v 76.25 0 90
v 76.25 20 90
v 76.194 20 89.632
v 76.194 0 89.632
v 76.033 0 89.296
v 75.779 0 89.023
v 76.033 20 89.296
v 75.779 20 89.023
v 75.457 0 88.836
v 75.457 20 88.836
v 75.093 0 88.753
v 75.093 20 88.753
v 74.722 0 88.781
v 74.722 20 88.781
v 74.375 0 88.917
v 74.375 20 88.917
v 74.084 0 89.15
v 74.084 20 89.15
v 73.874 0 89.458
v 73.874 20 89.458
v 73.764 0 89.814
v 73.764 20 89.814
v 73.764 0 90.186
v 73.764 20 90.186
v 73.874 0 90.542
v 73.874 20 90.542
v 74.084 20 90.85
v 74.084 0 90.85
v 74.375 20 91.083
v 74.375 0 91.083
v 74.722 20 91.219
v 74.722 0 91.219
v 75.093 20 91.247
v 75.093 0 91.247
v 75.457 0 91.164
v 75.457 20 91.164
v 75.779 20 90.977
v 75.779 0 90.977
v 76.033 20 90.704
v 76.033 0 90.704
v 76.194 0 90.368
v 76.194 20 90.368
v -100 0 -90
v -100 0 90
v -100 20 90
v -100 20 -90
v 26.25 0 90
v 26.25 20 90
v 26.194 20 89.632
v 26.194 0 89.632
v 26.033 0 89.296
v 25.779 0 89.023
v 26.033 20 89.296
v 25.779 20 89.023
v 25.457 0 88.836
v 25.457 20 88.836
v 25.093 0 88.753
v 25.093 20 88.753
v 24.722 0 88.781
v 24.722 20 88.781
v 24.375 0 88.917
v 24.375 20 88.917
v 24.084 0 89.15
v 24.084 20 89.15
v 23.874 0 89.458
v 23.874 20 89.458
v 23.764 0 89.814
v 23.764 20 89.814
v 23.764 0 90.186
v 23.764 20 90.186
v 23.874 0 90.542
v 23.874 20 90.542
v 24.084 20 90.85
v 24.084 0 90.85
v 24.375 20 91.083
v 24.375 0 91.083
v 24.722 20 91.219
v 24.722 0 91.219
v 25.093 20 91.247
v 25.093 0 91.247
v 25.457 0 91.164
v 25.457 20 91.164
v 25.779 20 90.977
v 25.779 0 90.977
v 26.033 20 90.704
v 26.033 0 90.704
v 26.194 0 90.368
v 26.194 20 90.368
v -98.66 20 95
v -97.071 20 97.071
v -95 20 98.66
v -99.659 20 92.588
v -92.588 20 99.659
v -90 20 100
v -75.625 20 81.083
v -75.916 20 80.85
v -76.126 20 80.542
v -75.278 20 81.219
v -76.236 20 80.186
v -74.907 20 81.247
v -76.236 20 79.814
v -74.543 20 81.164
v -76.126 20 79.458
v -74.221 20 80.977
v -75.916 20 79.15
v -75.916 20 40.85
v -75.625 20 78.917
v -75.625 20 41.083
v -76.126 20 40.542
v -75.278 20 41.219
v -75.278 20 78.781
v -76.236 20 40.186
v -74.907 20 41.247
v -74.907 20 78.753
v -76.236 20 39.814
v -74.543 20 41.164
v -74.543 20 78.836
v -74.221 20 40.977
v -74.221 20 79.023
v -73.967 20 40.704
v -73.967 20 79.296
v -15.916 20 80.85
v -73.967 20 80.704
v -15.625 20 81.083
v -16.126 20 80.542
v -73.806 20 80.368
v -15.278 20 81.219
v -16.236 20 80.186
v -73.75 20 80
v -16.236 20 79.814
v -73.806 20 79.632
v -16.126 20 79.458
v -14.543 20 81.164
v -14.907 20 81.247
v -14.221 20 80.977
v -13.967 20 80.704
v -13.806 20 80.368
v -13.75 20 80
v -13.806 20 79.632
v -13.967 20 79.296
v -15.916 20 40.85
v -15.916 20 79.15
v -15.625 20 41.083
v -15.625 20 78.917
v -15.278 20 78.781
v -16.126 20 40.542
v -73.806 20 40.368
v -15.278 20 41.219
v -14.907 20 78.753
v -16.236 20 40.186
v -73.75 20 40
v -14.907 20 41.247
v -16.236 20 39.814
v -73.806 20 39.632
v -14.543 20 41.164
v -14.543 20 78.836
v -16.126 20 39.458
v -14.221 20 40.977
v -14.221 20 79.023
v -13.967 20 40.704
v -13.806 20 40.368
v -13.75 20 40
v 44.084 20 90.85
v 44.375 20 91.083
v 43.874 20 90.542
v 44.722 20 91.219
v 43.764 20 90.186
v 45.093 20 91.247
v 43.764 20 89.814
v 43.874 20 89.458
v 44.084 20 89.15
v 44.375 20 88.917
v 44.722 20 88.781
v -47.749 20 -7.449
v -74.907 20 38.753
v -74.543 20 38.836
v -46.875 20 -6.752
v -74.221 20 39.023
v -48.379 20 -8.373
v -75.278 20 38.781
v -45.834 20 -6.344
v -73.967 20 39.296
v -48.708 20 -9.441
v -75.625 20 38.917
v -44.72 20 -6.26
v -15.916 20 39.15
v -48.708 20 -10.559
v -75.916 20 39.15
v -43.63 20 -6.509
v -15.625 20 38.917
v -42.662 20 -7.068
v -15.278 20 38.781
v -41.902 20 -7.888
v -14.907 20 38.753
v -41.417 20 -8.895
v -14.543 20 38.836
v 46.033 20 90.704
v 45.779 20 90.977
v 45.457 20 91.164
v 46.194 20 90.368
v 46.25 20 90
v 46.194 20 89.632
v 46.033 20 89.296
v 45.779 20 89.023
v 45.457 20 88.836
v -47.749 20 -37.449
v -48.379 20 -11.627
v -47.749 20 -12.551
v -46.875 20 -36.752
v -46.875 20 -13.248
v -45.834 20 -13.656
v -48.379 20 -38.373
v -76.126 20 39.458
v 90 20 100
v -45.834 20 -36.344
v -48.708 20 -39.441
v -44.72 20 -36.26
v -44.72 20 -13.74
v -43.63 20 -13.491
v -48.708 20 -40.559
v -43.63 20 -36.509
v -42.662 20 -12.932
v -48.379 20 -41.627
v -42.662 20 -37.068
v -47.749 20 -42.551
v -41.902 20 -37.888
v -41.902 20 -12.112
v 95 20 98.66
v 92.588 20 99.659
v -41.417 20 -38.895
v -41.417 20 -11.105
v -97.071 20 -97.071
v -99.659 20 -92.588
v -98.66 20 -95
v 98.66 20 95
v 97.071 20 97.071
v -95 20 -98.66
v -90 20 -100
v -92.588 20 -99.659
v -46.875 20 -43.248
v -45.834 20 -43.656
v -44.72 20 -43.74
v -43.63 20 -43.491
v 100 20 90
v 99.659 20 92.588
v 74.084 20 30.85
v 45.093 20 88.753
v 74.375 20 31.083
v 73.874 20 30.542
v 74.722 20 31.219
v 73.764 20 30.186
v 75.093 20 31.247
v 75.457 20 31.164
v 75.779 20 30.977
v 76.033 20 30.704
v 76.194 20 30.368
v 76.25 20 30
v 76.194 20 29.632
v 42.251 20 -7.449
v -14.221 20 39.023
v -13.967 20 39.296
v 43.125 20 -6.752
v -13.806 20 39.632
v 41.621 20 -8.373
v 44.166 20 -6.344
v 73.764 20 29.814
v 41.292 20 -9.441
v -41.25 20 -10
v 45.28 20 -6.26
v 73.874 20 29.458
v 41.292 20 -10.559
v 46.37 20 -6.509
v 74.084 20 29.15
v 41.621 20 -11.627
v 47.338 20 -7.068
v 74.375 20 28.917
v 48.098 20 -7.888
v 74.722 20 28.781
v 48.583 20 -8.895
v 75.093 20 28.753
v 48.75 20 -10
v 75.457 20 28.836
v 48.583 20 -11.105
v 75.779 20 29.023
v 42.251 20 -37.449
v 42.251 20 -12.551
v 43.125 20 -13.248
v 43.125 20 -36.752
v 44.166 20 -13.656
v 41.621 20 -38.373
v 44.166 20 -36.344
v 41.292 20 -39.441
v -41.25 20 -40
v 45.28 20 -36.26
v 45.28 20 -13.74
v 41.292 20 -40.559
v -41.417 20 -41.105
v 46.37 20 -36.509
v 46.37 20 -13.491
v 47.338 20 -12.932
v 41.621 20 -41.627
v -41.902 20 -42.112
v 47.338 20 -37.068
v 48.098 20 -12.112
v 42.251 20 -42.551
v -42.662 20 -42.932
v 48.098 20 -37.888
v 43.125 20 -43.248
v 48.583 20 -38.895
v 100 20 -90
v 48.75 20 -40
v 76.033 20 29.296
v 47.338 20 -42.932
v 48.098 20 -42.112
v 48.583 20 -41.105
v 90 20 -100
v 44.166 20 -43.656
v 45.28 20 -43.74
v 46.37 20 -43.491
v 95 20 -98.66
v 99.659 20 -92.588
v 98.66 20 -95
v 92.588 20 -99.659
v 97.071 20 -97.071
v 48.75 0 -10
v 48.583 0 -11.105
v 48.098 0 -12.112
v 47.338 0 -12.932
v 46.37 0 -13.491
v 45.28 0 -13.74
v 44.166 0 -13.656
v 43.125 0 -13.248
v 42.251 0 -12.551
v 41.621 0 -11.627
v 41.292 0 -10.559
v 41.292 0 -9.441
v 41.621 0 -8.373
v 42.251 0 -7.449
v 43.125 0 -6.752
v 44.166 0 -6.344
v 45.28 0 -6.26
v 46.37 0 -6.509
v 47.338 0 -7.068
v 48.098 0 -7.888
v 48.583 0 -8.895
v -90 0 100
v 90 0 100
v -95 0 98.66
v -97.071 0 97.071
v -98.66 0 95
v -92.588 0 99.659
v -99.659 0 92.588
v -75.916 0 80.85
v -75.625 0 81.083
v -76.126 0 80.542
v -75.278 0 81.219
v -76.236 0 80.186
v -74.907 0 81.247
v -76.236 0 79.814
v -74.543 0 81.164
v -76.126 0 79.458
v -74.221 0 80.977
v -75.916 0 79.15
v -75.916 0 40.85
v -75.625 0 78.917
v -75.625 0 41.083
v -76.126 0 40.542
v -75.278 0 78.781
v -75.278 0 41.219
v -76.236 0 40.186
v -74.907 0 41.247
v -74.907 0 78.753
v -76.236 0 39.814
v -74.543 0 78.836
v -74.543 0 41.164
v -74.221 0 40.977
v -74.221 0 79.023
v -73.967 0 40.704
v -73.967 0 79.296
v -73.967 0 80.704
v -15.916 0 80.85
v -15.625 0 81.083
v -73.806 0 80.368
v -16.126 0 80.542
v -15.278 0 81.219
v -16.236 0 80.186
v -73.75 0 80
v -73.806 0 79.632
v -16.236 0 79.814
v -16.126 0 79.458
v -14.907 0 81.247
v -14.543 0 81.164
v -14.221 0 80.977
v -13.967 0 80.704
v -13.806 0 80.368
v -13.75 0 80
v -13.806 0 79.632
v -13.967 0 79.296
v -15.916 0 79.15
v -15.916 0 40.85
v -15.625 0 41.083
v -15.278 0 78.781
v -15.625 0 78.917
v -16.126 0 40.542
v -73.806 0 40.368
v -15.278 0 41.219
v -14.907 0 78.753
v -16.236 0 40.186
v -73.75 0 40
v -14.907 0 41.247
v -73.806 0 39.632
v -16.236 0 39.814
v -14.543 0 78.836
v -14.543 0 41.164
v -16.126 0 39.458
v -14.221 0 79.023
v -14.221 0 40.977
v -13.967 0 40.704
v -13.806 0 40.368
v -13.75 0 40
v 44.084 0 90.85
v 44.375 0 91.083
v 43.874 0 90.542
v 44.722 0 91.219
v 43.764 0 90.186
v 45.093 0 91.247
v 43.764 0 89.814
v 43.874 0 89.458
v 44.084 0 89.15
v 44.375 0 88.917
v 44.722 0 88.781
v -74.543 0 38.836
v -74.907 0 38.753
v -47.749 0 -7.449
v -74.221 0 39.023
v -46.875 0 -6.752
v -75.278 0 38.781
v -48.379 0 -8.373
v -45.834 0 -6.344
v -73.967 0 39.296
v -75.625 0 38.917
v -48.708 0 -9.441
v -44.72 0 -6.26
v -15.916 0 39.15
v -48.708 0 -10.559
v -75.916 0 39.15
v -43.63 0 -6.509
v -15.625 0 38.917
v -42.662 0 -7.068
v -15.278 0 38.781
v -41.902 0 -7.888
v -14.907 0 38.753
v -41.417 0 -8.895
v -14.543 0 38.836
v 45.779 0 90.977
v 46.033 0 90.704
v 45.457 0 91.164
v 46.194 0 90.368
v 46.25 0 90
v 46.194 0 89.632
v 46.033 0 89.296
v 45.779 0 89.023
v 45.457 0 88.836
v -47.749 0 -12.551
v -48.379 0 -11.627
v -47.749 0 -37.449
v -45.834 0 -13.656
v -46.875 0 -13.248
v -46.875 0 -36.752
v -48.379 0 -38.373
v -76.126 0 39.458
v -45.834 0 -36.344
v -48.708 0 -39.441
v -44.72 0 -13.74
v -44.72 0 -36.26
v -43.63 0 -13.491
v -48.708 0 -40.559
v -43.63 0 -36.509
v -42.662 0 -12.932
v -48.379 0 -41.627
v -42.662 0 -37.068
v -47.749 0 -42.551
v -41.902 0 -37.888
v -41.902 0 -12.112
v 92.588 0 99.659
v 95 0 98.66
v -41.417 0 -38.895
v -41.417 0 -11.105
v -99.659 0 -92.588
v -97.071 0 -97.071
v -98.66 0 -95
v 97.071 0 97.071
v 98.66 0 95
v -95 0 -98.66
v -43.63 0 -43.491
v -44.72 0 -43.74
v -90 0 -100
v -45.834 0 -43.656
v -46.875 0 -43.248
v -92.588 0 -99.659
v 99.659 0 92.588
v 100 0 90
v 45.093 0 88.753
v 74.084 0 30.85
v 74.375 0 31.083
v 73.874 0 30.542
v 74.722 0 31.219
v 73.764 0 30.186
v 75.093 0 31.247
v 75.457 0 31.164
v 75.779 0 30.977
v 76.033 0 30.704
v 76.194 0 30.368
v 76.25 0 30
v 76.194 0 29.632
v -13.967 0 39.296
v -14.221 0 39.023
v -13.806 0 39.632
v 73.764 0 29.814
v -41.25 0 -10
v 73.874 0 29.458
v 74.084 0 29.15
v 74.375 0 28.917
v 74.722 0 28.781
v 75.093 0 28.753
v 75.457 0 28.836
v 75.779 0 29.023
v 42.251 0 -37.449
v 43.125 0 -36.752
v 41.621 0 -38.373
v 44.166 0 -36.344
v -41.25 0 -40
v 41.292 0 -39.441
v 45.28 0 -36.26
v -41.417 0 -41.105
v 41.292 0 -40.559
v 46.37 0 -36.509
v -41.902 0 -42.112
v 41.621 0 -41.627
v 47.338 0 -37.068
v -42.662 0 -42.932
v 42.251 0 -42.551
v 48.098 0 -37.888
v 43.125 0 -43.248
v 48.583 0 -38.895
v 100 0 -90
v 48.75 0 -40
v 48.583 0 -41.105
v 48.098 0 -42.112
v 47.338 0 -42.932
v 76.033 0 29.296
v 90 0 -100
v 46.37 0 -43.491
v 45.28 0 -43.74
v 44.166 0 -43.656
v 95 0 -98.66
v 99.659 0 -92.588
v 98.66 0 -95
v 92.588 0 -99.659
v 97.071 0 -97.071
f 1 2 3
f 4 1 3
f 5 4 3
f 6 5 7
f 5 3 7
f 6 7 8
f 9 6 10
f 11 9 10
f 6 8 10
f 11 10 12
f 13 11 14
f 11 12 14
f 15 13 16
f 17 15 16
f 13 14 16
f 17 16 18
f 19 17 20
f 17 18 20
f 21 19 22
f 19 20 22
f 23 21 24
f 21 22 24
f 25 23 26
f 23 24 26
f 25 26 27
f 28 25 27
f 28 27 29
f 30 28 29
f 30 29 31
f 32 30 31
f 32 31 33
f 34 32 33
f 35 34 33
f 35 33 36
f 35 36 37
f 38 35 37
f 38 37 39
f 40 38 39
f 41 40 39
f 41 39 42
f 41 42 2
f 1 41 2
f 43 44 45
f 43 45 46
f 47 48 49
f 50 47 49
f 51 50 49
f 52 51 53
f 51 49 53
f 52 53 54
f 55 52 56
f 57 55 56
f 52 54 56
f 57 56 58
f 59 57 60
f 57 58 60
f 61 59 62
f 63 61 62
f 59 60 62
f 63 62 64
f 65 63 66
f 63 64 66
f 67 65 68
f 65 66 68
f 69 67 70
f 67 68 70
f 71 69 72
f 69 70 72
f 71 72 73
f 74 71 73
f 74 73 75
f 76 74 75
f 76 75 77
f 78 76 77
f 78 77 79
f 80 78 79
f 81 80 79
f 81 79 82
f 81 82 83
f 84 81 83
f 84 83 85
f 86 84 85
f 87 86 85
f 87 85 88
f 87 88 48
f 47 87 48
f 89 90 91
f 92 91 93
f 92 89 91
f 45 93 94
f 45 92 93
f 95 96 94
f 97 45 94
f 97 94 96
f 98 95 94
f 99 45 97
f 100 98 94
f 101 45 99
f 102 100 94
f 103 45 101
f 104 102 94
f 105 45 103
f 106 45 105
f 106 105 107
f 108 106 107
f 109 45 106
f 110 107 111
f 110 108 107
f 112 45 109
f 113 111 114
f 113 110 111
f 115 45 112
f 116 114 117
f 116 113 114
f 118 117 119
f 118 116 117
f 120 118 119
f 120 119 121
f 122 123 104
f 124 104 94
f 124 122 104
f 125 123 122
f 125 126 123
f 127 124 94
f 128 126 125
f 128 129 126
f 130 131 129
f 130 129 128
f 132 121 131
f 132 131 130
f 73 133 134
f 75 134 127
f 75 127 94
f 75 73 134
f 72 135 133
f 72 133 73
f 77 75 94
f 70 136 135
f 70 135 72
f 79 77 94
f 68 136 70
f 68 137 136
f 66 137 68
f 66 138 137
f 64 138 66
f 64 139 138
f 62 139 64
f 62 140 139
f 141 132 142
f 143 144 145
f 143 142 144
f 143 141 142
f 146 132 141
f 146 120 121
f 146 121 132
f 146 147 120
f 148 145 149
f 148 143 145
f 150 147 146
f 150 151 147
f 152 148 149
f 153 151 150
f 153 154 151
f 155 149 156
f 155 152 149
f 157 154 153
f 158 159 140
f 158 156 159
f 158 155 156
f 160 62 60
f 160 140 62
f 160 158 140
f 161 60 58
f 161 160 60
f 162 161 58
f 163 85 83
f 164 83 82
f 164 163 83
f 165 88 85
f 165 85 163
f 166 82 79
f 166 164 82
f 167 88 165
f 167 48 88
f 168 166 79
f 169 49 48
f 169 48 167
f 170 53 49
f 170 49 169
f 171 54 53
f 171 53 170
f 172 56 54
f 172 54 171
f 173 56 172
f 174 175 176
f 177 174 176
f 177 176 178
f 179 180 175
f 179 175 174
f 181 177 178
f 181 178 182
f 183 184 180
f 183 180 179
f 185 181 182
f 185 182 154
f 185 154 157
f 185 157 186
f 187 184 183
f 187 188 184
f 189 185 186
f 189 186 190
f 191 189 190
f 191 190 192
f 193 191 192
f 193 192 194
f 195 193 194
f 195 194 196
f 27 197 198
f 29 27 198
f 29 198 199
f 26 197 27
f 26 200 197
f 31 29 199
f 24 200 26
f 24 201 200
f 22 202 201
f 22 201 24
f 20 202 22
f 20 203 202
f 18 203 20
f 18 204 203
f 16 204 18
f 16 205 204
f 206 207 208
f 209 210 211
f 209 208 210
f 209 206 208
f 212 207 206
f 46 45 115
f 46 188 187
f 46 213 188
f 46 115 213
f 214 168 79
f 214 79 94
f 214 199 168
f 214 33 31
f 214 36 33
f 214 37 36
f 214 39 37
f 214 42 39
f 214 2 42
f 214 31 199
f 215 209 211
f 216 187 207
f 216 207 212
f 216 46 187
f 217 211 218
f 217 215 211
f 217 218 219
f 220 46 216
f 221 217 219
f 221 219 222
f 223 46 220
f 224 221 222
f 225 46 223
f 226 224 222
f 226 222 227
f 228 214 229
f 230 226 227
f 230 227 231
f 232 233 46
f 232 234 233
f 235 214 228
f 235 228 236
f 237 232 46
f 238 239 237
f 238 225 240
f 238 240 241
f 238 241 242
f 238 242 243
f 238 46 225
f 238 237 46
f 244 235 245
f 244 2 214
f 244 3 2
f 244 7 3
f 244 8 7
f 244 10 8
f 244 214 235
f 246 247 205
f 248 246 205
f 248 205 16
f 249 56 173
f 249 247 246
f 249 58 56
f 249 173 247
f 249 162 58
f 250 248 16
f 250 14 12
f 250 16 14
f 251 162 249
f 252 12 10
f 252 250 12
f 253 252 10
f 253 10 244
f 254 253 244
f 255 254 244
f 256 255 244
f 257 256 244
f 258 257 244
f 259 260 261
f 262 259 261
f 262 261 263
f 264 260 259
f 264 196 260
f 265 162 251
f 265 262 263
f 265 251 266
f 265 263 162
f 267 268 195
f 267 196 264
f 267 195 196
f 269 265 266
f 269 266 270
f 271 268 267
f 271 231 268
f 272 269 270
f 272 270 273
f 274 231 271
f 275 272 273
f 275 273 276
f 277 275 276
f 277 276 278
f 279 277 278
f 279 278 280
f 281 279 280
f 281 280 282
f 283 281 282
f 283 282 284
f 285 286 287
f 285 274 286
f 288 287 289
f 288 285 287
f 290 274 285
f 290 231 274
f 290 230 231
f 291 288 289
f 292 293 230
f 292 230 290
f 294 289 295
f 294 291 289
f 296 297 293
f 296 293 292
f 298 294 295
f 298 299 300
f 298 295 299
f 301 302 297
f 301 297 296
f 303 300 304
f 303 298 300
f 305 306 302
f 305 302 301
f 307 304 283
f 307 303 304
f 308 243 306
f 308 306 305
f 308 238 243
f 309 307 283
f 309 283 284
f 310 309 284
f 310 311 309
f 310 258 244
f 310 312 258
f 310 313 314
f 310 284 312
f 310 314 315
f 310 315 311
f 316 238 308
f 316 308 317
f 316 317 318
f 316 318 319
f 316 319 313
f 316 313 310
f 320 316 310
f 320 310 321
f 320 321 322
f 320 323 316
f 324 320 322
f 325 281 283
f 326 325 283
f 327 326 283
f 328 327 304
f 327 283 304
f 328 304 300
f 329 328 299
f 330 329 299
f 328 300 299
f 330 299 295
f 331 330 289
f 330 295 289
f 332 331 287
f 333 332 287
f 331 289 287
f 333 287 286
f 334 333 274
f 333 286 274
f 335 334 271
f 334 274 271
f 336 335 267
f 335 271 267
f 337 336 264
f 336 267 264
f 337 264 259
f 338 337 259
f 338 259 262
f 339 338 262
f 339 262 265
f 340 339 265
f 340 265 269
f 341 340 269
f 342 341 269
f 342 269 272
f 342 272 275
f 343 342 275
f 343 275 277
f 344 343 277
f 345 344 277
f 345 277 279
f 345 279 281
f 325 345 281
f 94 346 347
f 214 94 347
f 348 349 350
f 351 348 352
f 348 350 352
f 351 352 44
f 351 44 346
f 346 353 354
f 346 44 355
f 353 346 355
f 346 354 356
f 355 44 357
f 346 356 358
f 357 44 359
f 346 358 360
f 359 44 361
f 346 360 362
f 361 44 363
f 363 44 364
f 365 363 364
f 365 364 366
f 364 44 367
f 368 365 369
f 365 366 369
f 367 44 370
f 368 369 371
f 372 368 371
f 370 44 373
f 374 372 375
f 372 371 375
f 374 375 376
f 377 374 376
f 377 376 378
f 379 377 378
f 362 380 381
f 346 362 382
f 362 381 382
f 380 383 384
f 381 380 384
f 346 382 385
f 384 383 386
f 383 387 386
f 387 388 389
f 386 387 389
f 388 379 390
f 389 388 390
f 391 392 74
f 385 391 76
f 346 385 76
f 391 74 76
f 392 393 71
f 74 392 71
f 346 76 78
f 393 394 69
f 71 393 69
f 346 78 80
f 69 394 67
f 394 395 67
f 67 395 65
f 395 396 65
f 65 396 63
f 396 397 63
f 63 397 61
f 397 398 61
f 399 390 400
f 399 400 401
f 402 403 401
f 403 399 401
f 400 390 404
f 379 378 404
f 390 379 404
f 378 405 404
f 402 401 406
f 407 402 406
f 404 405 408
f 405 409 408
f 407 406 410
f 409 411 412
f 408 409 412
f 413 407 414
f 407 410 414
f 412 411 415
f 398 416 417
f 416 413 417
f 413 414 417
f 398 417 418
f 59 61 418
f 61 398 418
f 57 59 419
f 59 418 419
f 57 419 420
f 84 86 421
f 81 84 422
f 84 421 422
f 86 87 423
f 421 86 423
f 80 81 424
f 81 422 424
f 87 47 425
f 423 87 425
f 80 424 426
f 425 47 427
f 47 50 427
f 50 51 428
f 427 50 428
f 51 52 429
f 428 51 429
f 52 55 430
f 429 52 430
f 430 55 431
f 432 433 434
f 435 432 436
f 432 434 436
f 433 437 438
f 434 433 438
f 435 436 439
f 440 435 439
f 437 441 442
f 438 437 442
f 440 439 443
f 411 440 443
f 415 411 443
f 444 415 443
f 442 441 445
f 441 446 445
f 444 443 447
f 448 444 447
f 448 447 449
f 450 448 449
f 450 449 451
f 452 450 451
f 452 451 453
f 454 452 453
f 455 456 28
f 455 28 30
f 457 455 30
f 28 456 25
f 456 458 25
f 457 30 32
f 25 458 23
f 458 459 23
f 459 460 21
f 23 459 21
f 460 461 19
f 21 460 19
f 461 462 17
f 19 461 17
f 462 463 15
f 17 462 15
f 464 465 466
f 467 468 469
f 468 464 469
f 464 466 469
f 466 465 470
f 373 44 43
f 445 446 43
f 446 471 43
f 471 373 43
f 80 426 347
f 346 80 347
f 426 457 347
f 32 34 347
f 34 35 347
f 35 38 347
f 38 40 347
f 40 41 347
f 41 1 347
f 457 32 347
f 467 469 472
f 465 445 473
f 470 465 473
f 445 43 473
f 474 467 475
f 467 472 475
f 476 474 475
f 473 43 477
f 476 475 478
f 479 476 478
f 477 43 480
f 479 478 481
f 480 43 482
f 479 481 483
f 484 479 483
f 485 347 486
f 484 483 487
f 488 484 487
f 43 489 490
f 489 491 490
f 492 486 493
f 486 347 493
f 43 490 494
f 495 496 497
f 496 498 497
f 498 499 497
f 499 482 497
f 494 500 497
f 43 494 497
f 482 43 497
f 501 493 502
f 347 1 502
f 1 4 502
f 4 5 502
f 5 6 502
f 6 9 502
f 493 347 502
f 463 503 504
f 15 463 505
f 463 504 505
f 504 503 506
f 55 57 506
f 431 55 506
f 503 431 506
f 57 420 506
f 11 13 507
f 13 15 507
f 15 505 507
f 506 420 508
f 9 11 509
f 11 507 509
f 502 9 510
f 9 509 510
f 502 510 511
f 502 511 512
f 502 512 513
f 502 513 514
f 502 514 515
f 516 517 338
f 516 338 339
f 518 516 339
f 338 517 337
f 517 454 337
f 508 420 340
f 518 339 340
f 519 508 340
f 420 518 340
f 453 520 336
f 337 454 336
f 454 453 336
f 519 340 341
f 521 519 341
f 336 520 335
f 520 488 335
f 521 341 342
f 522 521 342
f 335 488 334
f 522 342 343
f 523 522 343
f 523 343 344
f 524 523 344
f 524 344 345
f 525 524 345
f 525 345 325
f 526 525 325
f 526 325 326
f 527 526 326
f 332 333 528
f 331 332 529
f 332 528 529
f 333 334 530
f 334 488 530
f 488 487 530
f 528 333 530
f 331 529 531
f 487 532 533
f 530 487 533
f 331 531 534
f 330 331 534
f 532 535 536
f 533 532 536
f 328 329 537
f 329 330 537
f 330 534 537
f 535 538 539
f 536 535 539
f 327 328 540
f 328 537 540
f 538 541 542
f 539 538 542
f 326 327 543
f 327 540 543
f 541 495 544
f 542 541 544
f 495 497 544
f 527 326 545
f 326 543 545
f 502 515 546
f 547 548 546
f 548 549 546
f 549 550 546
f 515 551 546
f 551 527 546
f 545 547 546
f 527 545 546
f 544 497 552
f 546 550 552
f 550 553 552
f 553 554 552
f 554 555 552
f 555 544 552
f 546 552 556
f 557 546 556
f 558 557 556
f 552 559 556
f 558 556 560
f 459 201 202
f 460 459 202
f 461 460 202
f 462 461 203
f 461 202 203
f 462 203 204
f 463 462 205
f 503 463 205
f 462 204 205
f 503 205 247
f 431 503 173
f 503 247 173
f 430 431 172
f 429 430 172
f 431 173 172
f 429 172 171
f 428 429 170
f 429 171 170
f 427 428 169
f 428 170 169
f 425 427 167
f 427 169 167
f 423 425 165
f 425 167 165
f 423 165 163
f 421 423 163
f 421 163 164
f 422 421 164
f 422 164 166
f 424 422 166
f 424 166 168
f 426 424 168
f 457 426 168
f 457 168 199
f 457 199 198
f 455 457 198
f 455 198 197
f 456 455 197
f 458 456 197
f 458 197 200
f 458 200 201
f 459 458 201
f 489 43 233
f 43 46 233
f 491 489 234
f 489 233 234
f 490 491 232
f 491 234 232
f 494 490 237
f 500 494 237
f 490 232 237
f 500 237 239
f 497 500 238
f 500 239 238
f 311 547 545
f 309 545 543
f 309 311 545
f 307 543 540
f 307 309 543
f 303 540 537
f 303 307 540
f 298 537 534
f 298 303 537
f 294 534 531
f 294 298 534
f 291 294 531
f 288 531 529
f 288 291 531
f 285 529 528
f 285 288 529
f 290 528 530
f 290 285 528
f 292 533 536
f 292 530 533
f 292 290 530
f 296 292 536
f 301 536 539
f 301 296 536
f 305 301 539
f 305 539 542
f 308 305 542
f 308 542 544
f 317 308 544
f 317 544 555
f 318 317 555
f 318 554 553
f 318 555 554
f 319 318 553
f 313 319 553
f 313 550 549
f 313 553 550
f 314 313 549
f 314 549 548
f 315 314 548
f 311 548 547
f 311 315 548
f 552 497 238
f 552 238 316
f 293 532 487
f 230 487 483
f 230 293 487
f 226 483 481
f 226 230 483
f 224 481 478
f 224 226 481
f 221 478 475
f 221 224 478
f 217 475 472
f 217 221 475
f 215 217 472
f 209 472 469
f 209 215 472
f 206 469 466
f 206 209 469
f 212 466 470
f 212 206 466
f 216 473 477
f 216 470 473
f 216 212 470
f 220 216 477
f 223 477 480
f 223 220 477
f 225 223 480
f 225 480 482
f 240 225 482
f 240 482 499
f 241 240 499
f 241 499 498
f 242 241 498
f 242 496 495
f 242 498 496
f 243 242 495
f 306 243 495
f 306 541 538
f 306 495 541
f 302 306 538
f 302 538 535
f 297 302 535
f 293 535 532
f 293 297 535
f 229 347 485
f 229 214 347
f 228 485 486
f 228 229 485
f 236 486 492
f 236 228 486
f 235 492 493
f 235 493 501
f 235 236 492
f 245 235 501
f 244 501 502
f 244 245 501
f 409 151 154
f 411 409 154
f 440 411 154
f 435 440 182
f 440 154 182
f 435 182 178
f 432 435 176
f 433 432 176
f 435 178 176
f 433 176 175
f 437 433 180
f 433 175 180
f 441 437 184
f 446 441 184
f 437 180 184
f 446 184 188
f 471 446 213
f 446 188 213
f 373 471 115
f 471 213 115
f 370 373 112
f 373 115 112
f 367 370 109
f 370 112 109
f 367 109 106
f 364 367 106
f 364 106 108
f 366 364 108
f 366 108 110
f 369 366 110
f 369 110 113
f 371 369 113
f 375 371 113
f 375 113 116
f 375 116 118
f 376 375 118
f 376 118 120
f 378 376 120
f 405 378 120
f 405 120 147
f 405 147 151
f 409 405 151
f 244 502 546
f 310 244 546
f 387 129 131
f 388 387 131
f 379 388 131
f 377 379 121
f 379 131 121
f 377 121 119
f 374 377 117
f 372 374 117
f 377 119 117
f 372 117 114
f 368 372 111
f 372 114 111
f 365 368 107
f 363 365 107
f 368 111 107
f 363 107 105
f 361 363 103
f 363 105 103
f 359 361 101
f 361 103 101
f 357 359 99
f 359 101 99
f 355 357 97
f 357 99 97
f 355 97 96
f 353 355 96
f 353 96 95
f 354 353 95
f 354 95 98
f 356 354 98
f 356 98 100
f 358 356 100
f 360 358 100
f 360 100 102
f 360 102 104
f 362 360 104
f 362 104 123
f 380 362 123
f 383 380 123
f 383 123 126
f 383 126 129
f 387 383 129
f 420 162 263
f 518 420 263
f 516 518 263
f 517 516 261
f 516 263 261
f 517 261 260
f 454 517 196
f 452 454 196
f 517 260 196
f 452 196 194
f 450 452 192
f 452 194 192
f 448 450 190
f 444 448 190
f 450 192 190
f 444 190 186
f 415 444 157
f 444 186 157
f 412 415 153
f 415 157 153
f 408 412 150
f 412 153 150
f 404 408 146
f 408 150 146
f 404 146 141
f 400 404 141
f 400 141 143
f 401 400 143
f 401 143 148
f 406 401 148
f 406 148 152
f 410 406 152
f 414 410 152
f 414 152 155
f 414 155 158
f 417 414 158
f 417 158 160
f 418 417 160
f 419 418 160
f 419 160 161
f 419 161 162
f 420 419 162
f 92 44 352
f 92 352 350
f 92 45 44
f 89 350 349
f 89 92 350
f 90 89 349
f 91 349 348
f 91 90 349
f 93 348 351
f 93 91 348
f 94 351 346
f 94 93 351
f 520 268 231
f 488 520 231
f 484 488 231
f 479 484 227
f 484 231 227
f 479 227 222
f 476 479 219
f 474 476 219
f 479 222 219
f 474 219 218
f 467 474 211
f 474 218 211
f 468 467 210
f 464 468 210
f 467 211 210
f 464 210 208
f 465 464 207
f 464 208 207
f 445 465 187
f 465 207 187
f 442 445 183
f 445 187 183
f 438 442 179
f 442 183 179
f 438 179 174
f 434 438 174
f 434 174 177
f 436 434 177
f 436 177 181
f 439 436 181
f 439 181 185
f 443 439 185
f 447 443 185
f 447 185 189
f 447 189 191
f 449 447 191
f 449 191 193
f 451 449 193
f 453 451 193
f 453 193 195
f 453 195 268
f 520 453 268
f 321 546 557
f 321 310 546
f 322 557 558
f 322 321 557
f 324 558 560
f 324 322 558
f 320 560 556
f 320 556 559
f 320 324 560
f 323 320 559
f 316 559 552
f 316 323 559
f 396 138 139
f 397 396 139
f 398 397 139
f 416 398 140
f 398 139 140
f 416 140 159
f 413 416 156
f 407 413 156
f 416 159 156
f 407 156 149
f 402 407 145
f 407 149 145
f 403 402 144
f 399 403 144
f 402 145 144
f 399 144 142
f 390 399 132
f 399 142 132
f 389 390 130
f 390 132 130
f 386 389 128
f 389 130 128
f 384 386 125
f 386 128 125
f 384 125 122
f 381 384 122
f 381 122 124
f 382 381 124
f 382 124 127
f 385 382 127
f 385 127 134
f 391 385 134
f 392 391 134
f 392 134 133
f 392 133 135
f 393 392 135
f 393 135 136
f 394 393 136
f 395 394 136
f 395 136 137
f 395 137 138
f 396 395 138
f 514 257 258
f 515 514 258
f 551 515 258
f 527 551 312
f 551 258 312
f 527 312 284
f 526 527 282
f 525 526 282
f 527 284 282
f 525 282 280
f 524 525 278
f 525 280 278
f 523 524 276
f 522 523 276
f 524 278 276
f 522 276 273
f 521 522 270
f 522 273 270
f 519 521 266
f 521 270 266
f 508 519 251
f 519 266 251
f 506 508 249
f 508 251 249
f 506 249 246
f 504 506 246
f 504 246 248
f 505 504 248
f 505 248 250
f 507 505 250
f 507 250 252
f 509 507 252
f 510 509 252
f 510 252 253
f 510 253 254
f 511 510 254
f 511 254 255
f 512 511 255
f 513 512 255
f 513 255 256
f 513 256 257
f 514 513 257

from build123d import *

# Parameters (mm, degrees)
CROQUIS1_W              = 200
CROQUIS1_H              = 200
SALIENTE_EXTRUIR1_DEPTH = 20
REDONDEO1_R             = 10
CROQUIS5_W              = 120
CROQUIS5_H              = 80
SALIENTE_EXTRUIR3_DEPTH = 20
CROQUIS3_R              = 3.75
CORTAR_EXTRUIR2_DEPTH   = 21
CROQUIS6_R              = 1.25
CORTAR_EXTRUIR3_DEPTH   = 21


with BuildPart() as part:
    # Croquis1 → Saliente-Extruir1 (new body)
    with BuildSketch(Plane(origin=(0, 0, 0), x_dir=(1, 0, 0), z_dir=(0, 1, 0))):
        Rectangle(CROQUIS1_W, CROQUIS1_H)
    extrude(amount=SALIENTE_EXTRUIR1_DEPTH)

    # Redondeo1
    redondeo1_edges = [part.edges().sort_by_distance(p)[0] for p in [
        (100, 10, 100),
        (-100, 10, 100),
        (-100, 10, -100),
        (100, 10, -100),
    ]]
    fillet(redondeo1_edges, radius=REDONDEO1_R)

    # Croquis5 → Saliente-Extruir3 (add)
    with BuildSketch(Plane(origin=(0, 20, 0), x_dir=(1, 0, 0), z_dir=(0, 1, 0))):
        with Locations((0, 20)):
            Rectangle(CROQUIS5_W, CROQUIS5_H)
    extrude(amount=-SALIENTE_EXTRUIR3_DEPTH)

    # Croquis3 → Cortar-Extruir2 (cut, through all)
    with BuildSketch(Plane(origin=(0, 20, 0), x_dir=(1, 0, 0), z_dir=(0, 1, 0))):
        with Locations((-45, 10)):
            Circle(CROQUIS3_R)
        with Locations((45, 10)):
            Circle(CROQUIS3_R)
    cortar_extruir2 = extrude(amount=-CORTAR_EXTRUIR2_DEPTH, mode=Mode.SUBTRACT)

    # Simetría3: Cortar-Extruir2 across plane
    add(cortar_extruir2.mirror(Plane.XY.offset(-25)), mode=Mode.SUBTRACT)

    # Croquis6 → Cortar-Extruir3 (cut, through all)
    with BuildSketch(Plane(origin=(0, 20, 0), x_dir=(1, 0, 0), z_dir=(0, 1, 0))):
        with Locations((75, -90)):
            Circle(CROQUIS6_R)
        with Locations((75, -30)):
            Circle(CROQUIS6_R)
        with Locations((45, -90)):
            Circle(CROQUIS6_R)
        with Locations((25, -90)):
            Circle(CROQUIS6_R)
        with Locations((-15, -80)):
            Circle(CROQUIS6_R)
        with Locations((-15, -40)):
            Circle(CROQUIS6_R)
        with Locations((-75, -40)):
            Circle(CROQUIS6_R)
        with Locations((-75, -80)):
            Circle(CROQUIS6_R)
    extrude(amount=-CORTAR_EXTRUIR3_DEPTH, mode=Mode.SUBTRACT)


solid = part.part
